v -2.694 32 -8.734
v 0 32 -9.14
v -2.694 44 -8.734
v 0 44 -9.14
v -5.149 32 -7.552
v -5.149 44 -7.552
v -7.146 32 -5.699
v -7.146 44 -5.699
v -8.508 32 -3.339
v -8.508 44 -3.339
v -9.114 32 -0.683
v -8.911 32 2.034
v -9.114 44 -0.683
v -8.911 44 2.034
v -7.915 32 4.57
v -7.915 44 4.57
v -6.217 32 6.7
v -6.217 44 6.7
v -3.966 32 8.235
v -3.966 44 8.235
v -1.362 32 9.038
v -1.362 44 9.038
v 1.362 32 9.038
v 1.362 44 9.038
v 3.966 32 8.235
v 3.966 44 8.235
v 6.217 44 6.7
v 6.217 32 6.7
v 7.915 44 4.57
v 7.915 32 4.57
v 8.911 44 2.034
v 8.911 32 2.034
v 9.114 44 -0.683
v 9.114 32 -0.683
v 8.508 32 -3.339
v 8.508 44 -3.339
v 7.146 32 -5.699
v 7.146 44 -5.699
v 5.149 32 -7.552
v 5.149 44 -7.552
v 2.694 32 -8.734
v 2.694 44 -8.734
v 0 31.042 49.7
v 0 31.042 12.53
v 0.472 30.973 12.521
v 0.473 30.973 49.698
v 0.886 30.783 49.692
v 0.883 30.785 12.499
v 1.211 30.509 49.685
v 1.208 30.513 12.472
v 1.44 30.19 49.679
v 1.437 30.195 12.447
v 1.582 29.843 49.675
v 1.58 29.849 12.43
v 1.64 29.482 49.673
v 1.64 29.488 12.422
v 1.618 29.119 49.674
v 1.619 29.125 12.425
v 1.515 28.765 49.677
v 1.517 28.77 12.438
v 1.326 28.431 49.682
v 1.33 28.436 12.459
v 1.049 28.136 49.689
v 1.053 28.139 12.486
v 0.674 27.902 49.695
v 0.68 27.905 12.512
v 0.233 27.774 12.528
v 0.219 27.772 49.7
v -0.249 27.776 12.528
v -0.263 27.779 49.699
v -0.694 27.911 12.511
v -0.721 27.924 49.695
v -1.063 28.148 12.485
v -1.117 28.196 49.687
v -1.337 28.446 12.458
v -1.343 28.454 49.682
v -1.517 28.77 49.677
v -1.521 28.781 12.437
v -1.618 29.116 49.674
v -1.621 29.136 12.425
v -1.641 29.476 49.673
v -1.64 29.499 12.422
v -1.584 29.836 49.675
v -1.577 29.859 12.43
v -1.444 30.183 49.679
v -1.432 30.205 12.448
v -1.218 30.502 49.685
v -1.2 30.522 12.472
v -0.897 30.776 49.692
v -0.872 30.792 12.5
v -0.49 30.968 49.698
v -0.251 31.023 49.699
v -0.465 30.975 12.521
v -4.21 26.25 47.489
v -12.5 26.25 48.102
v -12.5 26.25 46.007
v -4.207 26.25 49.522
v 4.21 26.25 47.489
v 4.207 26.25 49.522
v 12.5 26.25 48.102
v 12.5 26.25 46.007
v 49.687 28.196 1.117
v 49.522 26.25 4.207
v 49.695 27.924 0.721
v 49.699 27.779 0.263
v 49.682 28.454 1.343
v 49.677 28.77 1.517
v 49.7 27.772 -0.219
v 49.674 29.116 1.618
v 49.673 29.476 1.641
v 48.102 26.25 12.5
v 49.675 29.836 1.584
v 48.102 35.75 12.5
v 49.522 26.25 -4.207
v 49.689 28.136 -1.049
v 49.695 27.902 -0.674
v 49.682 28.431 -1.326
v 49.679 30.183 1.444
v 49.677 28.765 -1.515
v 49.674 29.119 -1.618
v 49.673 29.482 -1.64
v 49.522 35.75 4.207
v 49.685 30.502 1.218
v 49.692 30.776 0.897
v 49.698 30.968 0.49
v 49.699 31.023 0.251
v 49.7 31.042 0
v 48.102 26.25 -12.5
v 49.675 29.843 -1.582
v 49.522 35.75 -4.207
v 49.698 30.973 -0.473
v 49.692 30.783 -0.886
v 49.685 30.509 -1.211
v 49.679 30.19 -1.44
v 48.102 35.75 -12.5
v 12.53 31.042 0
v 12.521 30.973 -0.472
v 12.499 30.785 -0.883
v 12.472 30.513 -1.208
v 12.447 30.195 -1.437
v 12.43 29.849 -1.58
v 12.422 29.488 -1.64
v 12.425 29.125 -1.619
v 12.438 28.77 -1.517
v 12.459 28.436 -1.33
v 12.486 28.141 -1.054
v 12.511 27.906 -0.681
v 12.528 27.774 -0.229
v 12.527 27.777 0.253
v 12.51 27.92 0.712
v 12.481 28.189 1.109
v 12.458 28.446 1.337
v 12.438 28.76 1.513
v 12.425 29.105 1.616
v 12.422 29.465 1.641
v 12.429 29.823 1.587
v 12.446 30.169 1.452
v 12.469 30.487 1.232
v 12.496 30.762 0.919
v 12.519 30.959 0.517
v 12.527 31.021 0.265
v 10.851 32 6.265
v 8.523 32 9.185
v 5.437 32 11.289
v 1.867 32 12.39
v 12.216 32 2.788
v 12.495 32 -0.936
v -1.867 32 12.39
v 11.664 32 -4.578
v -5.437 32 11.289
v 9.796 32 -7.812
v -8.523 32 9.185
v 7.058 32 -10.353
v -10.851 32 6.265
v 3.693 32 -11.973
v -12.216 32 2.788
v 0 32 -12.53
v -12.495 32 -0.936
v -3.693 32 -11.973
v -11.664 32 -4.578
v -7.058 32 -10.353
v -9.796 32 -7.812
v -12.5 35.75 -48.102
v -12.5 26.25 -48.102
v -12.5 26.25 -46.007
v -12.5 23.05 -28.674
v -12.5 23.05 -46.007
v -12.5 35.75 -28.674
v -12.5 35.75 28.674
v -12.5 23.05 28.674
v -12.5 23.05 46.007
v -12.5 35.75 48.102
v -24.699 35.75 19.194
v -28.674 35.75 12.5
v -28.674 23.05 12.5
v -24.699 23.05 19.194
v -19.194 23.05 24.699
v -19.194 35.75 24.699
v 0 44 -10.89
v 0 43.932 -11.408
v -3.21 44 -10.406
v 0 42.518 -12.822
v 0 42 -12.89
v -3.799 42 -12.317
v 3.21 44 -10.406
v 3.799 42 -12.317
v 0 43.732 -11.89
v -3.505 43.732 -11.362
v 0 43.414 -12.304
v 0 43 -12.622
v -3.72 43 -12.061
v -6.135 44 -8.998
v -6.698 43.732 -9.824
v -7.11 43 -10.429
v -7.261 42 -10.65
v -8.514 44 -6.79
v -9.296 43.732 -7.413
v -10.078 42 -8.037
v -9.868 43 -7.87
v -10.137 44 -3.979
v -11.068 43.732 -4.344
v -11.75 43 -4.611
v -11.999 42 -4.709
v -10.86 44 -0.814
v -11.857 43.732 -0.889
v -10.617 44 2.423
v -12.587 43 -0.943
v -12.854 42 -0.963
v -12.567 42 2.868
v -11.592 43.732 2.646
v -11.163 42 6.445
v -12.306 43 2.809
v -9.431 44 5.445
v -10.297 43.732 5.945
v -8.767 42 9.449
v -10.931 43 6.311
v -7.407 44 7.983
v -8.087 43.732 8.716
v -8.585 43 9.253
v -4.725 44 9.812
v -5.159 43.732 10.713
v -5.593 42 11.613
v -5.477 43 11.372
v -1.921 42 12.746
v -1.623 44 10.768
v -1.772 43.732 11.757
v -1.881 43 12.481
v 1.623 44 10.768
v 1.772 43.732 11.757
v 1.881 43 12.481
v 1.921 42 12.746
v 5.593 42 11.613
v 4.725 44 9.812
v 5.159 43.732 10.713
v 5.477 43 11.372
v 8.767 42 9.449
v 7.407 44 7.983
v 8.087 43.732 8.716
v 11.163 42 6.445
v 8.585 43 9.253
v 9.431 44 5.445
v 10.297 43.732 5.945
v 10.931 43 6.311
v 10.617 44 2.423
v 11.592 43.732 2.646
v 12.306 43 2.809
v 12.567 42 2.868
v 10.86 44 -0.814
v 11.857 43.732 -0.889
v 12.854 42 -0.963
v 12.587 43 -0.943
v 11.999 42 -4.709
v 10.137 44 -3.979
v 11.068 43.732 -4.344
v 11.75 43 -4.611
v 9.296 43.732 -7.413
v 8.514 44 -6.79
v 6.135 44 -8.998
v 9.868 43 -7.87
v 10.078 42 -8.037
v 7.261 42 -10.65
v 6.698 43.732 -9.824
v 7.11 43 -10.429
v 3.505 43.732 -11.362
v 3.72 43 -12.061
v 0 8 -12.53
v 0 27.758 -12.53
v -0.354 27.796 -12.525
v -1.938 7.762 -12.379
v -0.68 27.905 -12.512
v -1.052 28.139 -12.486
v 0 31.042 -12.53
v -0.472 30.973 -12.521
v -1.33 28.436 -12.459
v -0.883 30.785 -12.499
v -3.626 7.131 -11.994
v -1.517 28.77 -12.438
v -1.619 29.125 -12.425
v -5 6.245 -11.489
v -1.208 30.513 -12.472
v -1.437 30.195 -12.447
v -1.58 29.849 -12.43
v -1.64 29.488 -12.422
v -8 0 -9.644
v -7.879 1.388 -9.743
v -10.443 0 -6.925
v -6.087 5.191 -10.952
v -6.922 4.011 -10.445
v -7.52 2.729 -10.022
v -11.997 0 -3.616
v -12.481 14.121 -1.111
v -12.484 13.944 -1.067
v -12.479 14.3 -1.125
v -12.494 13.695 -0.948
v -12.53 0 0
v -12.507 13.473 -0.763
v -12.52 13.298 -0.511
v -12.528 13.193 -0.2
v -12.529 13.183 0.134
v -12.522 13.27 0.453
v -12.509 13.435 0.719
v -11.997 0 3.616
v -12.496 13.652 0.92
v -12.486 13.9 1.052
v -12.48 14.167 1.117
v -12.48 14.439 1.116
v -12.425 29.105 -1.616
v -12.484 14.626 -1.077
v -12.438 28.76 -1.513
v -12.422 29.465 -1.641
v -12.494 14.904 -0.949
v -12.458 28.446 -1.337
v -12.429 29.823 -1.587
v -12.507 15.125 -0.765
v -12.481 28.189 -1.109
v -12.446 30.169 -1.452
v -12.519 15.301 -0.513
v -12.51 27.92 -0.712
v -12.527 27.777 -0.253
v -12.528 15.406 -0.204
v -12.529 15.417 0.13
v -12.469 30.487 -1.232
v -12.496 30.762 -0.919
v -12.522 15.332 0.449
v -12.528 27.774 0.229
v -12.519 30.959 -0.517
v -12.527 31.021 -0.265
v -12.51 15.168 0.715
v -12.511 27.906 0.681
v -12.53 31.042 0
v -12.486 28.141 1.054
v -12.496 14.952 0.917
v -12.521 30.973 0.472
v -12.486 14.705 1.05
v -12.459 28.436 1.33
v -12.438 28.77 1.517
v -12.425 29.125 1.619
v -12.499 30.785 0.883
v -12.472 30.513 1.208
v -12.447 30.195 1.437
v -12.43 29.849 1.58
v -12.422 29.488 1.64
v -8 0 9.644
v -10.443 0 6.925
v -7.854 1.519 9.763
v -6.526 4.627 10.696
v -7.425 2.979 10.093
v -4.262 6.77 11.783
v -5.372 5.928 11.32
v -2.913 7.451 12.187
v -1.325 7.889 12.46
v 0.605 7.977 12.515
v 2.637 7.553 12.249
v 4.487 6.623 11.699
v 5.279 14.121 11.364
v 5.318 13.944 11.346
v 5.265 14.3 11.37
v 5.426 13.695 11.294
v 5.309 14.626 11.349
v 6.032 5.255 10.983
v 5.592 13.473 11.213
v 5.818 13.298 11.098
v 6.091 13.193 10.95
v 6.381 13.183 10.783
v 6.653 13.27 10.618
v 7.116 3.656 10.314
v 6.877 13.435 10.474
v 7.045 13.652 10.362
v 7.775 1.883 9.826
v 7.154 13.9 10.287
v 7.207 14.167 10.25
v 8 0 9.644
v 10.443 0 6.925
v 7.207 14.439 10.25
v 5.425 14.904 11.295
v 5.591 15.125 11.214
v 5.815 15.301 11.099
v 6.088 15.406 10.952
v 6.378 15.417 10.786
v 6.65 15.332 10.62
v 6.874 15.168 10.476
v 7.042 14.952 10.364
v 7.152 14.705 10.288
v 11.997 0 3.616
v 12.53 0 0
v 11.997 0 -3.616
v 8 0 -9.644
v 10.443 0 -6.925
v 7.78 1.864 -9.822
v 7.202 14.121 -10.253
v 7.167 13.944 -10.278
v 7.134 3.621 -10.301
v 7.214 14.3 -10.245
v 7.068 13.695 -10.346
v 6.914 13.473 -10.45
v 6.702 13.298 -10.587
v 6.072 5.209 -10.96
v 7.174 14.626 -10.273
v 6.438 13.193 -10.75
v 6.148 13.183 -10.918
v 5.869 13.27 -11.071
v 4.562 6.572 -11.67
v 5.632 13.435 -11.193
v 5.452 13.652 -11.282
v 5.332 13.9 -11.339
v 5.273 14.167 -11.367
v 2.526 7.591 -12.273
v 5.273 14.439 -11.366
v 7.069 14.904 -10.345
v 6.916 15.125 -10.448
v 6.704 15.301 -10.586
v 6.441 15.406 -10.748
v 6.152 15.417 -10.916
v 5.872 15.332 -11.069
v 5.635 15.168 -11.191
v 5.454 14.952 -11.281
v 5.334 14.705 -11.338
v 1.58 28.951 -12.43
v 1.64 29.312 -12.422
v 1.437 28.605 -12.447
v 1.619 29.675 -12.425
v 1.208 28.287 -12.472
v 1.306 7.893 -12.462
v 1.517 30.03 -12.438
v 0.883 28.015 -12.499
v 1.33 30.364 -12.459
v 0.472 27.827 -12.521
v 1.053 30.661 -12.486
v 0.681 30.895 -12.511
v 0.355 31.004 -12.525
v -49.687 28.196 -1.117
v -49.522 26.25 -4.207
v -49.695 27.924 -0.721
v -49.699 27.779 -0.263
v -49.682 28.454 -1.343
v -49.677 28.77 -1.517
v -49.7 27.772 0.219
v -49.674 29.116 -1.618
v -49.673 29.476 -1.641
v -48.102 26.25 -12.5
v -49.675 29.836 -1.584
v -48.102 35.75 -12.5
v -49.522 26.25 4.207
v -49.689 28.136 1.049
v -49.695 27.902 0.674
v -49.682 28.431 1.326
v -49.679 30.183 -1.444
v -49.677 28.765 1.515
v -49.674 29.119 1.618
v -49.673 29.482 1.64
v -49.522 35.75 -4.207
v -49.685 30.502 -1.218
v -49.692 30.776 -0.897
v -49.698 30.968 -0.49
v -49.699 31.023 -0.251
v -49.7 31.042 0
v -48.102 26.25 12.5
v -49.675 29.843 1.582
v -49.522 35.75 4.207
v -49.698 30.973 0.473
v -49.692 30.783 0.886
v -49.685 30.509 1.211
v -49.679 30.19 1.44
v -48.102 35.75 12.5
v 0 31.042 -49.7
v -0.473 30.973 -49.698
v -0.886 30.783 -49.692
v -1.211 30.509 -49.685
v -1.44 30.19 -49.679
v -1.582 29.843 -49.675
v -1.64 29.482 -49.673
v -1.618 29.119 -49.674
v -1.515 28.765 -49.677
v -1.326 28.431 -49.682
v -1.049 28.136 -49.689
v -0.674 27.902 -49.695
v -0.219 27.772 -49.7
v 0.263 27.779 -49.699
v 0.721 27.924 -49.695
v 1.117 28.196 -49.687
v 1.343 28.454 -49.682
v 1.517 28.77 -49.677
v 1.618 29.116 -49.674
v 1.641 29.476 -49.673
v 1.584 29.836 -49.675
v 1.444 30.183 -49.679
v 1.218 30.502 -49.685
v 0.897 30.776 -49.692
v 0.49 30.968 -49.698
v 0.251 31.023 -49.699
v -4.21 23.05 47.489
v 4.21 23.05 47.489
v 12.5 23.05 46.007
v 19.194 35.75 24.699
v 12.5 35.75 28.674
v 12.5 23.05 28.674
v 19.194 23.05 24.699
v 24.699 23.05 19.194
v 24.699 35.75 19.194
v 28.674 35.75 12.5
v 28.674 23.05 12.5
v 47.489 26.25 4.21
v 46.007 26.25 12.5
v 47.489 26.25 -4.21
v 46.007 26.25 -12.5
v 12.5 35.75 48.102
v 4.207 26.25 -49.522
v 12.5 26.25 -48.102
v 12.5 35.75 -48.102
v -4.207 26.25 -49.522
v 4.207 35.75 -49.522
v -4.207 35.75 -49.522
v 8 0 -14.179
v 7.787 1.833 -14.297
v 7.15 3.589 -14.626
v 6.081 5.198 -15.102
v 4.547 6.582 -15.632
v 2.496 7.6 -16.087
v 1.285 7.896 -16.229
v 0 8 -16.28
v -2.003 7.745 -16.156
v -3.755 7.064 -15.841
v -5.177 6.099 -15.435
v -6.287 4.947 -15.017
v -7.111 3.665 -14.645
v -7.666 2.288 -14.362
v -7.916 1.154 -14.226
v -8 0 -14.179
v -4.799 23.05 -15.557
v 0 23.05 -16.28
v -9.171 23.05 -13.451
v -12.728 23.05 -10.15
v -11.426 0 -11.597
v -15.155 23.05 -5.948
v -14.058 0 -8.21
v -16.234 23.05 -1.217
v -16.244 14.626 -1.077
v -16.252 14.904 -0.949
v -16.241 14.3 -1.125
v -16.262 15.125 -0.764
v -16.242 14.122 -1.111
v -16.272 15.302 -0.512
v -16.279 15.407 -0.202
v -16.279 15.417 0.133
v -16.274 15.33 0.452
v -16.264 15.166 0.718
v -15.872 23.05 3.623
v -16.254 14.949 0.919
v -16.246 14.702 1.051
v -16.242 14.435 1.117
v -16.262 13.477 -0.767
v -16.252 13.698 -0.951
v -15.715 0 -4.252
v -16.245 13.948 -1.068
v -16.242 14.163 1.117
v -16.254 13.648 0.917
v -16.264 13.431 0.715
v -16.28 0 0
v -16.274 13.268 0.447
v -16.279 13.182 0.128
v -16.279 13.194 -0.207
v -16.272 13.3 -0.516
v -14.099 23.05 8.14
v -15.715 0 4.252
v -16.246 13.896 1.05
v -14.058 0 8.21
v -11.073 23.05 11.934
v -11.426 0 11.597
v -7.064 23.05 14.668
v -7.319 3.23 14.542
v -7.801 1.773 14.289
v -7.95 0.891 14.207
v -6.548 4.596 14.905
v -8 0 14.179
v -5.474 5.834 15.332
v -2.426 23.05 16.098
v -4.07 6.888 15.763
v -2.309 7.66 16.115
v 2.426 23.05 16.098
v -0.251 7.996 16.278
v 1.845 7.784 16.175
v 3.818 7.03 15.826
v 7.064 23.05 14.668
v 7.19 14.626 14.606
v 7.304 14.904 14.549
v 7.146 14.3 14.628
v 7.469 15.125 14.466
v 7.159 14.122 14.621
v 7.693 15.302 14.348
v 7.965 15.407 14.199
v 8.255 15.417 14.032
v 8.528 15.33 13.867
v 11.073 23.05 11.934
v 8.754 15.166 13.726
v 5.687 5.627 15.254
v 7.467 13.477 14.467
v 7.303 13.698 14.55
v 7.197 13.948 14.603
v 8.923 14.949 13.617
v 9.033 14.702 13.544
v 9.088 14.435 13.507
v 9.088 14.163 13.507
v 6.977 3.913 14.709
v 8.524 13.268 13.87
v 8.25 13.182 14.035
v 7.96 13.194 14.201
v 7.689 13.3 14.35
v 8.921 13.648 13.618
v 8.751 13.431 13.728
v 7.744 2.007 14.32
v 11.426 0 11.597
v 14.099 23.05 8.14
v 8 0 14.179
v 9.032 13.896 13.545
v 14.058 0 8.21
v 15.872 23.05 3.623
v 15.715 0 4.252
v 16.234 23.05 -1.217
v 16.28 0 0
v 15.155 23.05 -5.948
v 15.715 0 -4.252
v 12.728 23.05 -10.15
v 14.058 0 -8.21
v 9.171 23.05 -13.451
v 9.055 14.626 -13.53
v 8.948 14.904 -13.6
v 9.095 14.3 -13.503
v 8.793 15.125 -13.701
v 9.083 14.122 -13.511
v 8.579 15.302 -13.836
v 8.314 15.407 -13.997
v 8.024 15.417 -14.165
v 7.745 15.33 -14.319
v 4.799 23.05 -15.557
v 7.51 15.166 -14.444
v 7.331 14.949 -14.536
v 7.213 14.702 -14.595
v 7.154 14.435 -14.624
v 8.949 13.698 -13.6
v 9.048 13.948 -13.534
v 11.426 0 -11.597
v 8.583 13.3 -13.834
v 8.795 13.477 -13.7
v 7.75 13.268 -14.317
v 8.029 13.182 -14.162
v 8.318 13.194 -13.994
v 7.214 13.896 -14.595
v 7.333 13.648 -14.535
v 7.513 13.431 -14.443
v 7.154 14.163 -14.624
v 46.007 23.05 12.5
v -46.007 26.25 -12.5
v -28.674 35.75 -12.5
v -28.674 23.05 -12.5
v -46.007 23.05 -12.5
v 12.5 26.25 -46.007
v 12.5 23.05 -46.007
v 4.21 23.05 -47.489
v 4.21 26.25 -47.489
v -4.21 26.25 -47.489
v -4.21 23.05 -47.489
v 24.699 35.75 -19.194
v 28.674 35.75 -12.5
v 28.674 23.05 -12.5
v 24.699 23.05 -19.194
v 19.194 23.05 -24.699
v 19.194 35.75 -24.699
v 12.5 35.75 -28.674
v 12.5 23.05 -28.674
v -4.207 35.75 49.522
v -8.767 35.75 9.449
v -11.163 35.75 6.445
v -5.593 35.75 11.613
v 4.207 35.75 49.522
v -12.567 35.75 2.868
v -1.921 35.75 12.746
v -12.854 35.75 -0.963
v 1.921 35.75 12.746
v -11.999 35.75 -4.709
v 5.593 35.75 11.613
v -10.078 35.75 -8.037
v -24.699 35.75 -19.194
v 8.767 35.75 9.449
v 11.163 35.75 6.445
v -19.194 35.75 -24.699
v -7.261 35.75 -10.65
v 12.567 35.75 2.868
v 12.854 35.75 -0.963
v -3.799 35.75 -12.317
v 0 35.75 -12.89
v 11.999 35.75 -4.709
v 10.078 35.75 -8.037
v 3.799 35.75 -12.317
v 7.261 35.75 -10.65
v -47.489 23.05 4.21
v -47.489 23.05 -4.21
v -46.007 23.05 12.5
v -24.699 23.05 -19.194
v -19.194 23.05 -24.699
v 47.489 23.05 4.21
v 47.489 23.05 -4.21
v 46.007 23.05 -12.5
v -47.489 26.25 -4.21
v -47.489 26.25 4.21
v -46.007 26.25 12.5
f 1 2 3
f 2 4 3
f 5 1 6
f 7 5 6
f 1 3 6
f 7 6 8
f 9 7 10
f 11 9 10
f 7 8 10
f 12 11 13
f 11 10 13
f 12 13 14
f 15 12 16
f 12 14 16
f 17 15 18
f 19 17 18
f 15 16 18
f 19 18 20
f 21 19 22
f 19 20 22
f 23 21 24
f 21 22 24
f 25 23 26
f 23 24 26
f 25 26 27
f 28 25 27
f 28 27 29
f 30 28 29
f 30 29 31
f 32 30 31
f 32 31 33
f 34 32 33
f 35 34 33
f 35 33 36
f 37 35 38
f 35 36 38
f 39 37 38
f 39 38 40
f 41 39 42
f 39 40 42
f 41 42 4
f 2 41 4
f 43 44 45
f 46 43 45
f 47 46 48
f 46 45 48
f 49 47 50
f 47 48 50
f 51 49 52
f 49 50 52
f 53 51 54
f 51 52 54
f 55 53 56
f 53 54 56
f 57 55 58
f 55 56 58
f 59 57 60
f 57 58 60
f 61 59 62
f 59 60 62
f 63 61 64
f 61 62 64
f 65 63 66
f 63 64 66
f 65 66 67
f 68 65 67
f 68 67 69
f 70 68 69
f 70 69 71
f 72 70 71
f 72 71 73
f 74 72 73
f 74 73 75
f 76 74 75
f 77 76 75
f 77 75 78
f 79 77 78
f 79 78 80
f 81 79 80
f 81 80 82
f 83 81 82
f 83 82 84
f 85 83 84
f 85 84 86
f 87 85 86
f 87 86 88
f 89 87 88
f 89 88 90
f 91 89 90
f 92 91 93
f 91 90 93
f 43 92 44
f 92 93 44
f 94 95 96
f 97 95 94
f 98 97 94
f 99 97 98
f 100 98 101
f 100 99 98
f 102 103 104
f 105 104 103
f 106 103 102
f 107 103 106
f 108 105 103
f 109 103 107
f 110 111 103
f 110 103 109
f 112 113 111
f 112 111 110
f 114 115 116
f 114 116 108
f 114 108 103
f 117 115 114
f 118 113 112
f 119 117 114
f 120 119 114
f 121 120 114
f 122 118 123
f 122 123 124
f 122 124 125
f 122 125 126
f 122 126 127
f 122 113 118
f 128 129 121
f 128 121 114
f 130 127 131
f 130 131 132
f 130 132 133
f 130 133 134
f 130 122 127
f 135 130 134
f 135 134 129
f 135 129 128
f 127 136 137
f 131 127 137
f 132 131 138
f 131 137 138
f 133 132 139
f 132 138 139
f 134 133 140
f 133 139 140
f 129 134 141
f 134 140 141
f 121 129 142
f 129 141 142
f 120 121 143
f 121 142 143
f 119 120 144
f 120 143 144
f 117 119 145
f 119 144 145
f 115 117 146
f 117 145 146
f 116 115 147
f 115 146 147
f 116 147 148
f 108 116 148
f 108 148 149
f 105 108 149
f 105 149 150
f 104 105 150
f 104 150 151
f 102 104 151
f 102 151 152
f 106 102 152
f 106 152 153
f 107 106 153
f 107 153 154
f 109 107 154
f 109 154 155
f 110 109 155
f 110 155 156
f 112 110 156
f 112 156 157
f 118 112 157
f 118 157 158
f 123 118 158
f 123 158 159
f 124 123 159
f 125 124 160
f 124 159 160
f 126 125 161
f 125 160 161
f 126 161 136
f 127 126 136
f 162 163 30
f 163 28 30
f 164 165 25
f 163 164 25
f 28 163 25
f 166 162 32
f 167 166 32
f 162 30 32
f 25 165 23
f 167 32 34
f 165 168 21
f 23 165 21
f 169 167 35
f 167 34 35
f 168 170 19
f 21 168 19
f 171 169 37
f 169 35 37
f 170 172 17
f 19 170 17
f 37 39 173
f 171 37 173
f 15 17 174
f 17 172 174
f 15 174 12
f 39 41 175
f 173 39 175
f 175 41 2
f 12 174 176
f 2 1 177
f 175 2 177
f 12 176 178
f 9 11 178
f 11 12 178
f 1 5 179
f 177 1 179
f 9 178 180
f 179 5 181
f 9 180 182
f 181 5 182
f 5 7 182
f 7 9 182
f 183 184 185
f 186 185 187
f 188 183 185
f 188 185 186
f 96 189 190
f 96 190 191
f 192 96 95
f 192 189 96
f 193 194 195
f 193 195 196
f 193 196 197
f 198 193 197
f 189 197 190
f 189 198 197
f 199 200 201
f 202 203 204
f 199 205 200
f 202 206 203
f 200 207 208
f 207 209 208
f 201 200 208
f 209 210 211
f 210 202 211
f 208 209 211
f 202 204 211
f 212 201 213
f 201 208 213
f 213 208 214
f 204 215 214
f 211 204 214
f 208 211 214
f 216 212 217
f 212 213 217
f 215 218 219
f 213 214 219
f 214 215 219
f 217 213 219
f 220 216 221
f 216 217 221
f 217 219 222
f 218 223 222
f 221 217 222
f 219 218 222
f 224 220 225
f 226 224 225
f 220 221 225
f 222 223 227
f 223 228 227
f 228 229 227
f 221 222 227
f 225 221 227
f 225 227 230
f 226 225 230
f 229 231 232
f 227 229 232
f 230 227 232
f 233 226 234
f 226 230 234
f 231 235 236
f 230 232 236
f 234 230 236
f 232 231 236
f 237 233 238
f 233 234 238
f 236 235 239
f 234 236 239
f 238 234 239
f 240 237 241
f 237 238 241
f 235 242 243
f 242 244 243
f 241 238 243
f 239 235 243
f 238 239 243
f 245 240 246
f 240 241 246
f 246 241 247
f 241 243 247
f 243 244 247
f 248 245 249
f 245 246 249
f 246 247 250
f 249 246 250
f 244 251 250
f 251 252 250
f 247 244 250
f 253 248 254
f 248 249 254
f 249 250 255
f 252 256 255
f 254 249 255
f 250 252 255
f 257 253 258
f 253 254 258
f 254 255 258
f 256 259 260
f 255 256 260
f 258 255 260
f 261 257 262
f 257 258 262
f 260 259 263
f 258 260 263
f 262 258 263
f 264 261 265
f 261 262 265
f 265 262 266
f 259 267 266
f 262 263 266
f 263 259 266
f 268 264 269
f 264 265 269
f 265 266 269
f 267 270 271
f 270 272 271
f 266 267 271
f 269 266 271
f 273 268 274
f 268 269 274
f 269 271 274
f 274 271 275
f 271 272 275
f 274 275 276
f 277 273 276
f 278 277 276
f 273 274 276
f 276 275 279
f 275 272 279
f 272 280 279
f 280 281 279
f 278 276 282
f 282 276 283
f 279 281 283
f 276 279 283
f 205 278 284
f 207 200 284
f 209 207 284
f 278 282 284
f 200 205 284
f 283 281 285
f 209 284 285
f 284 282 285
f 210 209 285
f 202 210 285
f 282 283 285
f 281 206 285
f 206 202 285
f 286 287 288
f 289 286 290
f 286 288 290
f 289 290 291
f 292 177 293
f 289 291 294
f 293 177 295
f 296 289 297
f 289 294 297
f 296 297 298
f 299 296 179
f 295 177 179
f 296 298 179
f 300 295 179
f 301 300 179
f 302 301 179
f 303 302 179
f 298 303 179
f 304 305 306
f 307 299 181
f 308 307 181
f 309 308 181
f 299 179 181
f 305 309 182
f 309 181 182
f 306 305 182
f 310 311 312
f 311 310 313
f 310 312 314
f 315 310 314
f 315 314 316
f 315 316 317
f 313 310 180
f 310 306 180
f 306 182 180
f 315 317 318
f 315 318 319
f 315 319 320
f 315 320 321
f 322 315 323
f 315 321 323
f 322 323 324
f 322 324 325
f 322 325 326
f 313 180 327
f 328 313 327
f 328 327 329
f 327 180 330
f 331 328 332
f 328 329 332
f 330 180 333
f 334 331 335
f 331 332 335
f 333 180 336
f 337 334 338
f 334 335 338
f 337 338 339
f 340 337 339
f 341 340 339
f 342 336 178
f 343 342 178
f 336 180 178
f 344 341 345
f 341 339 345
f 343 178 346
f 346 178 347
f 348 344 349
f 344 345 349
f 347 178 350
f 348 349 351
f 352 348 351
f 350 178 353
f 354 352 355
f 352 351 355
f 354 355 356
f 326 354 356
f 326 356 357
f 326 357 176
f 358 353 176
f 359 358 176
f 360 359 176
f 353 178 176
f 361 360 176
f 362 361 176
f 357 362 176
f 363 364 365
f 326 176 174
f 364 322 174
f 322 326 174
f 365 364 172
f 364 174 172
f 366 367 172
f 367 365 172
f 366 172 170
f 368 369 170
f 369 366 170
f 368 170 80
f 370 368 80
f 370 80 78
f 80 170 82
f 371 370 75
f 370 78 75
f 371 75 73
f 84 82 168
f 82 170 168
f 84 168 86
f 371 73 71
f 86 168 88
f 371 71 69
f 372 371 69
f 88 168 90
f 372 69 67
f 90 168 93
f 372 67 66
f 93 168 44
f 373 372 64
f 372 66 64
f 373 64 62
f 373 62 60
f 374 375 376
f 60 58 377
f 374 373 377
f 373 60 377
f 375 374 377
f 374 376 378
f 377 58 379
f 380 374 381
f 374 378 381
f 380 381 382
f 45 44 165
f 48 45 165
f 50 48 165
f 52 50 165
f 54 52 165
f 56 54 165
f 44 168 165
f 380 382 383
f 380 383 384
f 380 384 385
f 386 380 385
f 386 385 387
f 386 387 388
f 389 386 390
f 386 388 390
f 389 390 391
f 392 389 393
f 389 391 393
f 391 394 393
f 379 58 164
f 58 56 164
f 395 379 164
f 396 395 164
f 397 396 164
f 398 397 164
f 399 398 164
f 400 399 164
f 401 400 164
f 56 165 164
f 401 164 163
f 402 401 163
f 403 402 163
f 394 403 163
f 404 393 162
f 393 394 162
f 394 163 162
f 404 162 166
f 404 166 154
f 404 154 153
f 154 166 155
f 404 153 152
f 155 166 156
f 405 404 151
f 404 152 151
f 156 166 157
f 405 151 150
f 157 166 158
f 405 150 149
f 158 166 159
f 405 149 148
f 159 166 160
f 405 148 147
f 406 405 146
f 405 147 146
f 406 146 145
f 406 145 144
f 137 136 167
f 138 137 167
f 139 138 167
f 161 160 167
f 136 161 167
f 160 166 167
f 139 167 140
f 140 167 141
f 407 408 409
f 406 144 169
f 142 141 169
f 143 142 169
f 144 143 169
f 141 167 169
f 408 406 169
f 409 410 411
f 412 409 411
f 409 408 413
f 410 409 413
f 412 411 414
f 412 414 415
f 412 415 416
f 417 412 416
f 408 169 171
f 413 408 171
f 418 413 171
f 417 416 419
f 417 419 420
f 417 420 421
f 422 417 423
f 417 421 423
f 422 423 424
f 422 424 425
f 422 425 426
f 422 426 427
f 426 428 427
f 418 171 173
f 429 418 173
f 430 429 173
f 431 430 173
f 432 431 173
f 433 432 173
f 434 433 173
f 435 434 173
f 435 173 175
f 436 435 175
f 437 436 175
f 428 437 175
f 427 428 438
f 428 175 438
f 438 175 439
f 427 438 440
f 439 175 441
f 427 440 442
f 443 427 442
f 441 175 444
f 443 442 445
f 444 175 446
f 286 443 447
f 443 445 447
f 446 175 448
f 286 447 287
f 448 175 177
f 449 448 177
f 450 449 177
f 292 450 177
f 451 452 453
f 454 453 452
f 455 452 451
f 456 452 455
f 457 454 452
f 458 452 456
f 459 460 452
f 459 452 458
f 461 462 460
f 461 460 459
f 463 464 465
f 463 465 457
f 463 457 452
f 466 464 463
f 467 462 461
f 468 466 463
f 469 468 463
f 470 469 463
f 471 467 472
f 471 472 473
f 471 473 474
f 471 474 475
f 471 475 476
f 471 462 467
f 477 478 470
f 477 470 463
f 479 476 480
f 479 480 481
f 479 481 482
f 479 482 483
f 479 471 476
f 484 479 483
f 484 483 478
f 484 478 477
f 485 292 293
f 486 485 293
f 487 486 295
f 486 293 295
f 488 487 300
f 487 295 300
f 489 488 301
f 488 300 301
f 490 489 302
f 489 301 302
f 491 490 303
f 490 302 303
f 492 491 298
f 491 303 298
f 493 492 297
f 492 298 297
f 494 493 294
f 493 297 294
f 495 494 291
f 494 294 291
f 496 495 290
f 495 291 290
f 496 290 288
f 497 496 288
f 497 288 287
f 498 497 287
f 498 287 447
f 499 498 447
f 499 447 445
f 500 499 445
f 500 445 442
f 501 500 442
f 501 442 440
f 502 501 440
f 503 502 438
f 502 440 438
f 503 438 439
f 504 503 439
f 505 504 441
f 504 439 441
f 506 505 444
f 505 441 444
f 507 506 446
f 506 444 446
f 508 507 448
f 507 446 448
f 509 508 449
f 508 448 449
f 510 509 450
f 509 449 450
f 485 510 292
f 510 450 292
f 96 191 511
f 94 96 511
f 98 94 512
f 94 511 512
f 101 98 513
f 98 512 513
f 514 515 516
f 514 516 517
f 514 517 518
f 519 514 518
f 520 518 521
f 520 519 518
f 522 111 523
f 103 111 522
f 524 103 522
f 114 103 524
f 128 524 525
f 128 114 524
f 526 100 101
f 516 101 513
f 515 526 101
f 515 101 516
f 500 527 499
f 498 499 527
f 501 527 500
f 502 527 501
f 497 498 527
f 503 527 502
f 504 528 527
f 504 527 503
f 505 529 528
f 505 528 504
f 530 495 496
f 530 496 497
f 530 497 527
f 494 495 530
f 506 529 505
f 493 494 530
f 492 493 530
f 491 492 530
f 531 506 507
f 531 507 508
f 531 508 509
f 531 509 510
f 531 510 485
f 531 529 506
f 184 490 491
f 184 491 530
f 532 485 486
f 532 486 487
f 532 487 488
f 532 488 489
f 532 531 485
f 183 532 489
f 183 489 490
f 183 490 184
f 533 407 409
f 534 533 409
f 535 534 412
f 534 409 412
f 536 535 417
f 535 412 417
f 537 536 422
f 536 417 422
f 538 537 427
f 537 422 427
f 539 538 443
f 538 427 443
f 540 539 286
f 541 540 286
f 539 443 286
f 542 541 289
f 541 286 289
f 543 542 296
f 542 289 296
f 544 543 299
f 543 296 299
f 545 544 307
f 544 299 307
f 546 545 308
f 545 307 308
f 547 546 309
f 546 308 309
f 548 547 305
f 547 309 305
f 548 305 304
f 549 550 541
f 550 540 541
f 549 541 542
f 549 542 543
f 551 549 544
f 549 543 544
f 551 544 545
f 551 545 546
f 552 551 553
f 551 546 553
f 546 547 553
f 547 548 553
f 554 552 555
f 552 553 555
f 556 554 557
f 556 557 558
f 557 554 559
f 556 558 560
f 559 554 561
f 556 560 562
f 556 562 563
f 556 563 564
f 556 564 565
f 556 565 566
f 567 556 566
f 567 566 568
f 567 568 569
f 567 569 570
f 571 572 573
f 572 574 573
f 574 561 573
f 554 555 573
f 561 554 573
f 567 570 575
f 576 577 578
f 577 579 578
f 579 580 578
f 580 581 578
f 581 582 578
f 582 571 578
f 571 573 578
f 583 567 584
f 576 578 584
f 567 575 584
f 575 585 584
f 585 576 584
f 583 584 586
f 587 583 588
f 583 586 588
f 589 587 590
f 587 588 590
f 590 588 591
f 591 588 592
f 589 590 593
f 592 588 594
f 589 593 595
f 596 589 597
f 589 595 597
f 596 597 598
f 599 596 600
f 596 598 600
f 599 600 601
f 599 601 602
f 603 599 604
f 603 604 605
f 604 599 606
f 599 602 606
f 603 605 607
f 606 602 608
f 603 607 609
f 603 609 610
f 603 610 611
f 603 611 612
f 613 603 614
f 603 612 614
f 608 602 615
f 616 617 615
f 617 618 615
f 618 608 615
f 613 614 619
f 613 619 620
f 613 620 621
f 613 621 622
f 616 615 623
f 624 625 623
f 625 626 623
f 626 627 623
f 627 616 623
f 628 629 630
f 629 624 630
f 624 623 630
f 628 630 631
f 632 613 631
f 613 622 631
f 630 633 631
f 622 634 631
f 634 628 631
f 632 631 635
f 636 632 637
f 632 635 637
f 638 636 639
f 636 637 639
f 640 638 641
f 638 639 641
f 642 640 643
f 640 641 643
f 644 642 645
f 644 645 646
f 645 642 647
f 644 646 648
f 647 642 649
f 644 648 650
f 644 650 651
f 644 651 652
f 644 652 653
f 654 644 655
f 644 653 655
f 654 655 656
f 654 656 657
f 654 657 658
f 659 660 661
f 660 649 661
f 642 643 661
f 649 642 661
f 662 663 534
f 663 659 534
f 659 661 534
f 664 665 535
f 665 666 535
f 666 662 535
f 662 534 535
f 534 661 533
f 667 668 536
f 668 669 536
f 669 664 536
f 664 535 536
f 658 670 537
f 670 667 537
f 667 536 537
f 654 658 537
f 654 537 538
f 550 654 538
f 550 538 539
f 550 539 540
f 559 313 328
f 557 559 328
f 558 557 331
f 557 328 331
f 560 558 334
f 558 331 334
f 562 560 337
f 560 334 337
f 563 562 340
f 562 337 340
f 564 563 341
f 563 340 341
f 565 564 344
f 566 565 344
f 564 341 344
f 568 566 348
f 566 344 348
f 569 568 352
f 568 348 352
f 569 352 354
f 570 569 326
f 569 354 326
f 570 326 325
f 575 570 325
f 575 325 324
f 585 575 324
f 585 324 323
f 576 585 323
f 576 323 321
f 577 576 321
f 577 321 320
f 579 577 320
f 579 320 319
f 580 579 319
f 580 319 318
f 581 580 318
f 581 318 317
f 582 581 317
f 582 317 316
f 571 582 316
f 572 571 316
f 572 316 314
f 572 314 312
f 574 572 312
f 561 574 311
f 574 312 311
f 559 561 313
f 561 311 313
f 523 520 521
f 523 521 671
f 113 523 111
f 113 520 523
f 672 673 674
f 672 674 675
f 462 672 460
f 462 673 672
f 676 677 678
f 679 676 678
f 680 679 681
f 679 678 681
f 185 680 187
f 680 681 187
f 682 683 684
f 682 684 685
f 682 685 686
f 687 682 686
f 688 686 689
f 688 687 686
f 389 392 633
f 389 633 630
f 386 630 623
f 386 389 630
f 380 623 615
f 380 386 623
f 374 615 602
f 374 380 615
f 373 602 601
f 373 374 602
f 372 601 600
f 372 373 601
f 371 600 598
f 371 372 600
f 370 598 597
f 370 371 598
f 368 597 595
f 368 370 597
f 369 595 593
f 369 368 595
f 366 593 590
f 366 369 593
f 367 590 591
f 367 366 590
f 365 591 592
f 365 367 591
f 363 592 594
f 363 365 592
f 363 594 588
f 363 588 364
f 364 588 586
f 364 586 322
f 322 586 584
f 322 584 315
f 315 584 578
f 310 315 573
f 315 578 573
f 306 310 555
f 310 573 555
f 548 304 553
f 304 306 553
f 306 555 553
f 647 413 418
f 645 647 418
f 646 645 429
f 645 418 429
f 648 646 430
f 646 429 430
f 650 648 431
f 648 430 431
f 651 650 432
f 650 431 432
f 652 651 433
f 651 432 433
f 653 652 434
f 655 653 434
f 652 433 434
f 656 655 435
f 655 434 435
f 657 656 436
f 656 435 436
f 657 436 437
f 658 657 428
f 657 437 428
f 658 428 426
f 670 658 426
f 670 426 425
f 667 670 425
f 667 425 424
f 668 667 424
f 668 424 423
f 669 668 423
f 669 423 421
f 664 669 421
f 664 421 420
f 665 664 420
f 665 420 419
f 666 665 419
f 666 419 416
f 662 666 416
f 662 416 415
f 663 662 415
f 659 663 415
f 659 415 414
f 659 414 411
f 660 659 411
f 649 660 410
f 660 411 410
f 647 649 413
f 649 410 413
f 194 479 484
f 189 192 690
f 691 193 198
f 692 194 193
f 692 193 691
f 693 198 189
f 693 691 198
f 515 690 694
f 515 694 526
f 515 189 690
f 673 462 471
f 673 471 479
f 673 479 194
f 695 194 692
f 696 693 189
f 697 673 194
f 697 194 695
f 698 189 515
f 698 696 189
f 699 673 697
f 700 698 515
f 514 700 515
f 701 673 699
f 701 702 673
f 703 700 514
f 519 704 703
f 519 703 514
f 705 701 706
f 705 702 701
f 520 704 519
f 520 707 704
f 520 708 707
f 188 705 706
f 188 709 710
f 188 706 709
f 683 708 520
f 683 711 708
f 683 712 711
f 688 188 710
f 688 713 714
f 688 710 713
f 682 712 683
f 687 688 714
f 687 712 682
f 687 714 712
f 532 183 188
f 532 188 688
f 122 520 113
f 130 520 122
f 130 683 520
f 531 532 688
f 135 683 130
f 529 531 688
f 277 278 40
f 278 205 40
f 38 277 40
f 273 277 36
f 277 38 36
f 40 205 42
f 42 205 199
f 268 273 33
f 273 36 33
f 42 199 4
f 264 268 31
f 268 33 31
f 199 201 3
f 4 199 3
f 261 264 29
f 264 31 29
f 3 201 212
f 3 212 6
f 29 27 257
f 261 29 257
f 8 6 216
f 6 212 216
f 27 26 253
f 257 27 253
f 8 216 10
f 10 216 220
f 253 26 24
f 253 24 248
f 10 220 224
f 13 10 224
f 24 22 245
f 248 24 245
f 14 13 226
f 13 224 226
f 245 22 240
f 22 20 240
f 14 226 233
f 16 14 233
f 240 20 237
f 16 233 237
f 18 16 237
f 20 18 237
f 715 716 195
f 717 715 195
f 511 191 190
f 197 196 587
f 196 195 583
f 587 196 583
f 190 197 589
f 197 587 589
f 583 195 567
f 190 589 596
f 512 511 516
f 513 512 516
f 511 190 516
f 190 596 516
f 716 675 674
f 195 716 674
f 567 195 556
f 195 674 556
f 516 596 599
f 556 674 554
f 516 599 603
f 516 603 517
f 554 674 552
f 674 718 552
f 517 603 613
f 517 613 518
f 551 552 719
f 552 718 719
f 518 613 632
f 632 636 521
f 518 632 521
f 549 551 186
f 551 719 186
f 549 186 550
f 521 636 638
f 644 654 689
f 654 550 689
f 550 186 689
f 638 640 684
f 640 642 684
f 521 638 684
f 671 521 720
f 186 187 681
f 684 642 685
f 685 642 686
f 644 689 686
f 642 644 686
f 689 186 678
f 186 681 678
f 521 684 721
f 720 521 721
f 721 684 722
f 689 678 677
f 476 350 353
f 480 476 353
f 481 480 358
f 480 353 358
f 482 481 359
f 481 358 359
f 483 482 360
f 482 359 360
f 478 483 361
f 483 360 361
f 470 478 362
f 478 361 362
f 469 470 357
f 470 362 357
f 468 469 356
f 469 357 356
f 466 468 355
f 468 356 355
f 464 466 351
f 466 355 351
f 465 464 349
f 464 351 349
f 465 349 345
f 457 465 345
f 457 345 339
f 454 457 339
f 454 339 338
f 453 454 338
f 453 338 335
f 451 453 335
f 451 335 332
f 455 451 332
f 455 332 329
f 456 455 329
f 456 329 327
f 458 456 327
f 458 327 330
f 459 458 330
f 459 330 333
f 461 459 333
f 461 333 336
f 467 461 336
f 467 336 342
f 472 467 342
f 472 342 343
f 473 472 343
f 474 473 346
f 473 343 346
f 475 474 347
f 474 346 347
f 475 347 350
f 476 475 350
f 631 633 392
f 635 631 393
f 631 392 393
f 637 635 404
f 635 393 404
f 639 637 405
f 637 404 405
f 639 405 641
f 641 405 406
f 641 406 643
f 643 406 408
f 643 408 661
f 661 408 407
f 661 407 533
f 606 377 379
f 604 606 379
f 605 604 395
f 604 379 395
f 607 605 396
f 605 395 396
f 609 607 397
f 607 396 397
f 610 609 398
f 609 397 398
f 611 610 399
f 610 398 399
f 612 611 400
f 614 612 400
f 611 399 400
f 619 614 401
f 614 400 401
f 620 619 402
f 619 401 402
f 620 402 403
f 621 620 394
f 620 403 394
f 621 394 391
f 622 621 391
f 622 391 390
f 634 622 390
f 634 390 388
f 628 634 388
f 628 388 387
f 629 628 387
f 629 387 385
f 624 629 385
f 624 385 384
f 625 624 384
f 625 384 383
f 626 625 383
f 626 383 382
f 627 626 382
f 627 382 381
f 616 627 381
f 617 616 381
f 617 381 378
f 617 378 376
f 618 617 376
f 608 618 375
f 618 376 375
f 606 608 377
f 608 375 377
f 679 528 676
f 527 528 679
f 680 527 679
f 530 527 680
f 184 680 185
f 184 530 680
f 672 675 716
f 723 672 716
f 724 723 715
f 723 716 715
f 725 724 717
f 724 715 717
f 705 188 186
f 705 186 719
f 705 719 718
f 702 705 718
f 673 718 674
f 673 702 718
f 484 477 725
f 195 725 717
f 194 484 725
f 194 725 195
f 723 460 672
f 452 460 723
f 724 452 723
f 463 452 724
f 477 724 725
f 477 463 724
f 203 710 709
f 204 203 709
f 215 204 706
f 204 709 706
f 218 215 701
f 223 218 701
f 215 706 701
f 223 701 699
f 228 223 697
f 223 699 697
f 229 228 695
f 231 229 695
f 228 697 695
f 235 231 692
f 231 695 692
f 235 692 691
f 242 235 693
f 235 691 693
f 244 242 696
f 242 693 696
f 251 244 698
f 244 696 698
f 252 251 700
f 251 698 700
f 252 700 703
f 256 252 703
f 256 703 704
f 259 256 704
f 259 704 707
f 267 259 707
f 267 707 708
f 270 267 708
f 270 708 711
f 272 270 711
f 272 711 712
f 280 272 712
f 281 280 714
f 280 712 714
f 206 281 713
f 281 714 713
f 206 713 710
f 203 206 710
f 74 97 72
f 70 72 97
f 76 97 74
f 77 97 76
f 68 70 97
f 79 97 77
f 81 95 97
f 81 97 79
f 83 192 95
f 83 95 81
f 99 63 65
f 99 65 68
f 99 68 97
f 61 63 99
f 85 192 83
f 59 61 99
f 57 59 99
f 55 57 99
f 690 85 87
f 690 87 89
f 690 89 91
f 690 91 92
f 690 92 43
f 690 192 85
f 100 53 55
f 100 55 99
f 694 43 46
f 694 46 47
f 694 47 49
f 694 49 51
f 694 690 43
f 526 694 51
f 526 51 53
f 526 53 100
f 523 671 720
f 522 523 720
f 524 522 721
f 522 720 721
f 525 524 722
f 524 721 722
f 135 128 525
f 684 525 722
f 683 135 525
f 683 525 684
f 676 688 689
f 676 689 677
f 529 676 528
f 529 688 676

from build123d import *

# Parameters (mm, degrees)
CUT_EXTRUDE3_DEPTH      = 17.28
CUT_EXTRUDE3_DEPTH_BACK = 17.28
SKETCH3_R               = 1.125
CUT_EXTRUDE4_DEPTH      = 17.2800001
CIRPATTERN1_COUNT       = 3
FILLET4_R               = 2
SKETCH4_R               = 16.28
BOSS_EXTRUDE1_DEPTH     = 12.7
SKETCH5_R               = 1.6425
CUT_EXTRUDE5_DEPTH      = 50.7
CUT_EXTRUDE6_DEPTH      = 3.2004
CIRPATTERN2_COUNT       = 4
CIRPATTERN3_COUNT       = 4


with BuildPart() as part:
    # Sketch1 → Revolve1 (revolve)
    with BuildSketch(Plane.XY, mode=Mode.PRIVATE) as revolve1_sk:
        Polygon((9.14, 44), (12.89, 44), (12.89, 35.75), (16.28, 35.75), (16.28, 0), (12.53, 0), (12.53, 32), (9.14, 32), align=None)
    revolve(revolve1_sk.sketch.rotate(Axis((0, 0, 0), (0, 1, 0)), 90), axis=Axis((0, 0, 0), (0, 1, 0)))  # turned: the seam where the file's is

    # Sketch2 → Cut-Extrude3 (cut, two sides)
    with BuildSketch(Plane.XY) as cut_extrude3_sk:
        with BuildLine():
            Line((-8, 0), (8, 0))
            ThreePointArc((8, 0), (0, 8), (-8, 0))
        make_face()
    extrude(amount=CUT_EXTRUDE3_DEPTH, mode=Mode.SUBTRACT)
    extrude(cut_extrude3_sk.sketch, amount=-CUT_EXTRUDE3_DEPTH_BACK, mode=Mode.SUBTRACT)

    # Sketch3 → Cut-Extrude4 (cut, through all)
    with BuildSketch(Plane(origin=(0, 0, 0), x_dir=(0, 0, -1), z_dir=(1, 0, 0))):
        with Locations((0, 14.3)):
            Circle(SKETCH3_R)
    cut_extrude4 = extrude(amount=-CUT_EXTRUDE4_DEPTH, mode=Mode.SUBTRACT)

    # CirPattern1: Cut-Extrude4 ×3 about axis
    cirpattern1_axis = Axis((0, 46.725, 0), (0, -1, 0))
    for i in range(1, CIRPATTERN1_COUNT):
        add(cut_extrude4.rotate(cirpattern1_axis, i * 360 / CIRPATTERN1_COUNT), mode=Mode.SUBTRACT)

    # Fillet4
    fillet4_edges = [part.edges().sort_by_distance(p)[0] for p in [
        (0, 44, 12.89),
    ]]
    fillet(fillet4_edges, radius=FILLET4_R)

    # Sketch4 → Boss-Extrude1 (add)
    with BuildSketch(Plane(origin=(0, 35.75, 0), x_dir=(1, 0, 0), z_dir=(0, 1, 0))):
        with BuildLine():
            Line((-12.5, 48.102390793), (-12.5, 28.673827788))
            ThreePointArc((-12.5, 28.673827788), (-22.118300116, 22.118300116), (-28.673827788, 12.5))
            Line((-28.673827788, 12.5), (-48.102390793, 12.5))
            ThreePointArc((-48.102390793, 12.5), (-49.7, 0), (-48.102390793, -12.5))
            Line((-48.102390793, -12.5), (-28.673827788, -12.5))
            ThreePointArc((-28.673827788, -12.5), (-22.118300116, -22.118300116), (-12.5, -28.673827788))
            Line((-12.5, -28.673827788), (-12.5, -48.102390793))
            ThreePointArc((-12.5, -48.102390793), (0, -49.7), (12.5, -48.102390793))
            Line((12.5, -48.102390793), (12.5, -28.673827788))
            ThreePointArc((12.5, -28.673827788), (22.118300116, -22.118300116), (28.673827788, -12.5))
            Line((28.673827788, -12.5), (48.102390793, -12.5))
            ThreePointArc((48.102390793, -12.5), (49.7, 0), (48.102390793, 12.5))
            Line((48.102390793, 12.5), (28.673827788, 12.5))
            ThreePointArc((28.673827788, 12.5), (22.118300116, 22.118300116), (12.5, 28.673827788))
            Line((12.5, 28.673827788), (12.5, 48.102390793))
            ThreePointArc((12.5, 48.102390793), (0, 49.7), (-12.5, 48.102390793))
        make_face()
        with Locations(Location((0, 0, 0), (0, 0, 119.432673442))):  # turned: the seam where the file's is
            Circle(SKETCH4_R, mode=Mode.SUBTRACT)
    extrude(amount=-BOSS_EXTRUDE1_DEPTH)

    # Sketch5 → Cut-Extrude5 (cut, through all)
    with BuildSketch(Plane.XY):
        with Locations(Location((0, 29.4, 0), (0, 0, 90))):  # turned: the seam where the file's is
            Circle(SKETCH5_R)
    cut_extrude5 = extrude(amount=-CUT_EXTRUDE5_DEPTH, mode=Mode.SUBTRACT)

    # Sketch6 → Cut-Extrude6 (cut)
    with BuildSketch(Plane.XZ.offset(-23.05)):
        with BuildLine():
            Line((-12.5, 48.102390793), (-12.5, 46.007125807))
            ThreePointArc((-12.5, 46.007125807), (0, 47.675), (12.5, 46.007125807))
            Line((12.5, 46.007125807), (12.5, 48.102390793))
            ThreePointArc((12.5, 48.102390793), (0, 49.7), (-12.5, 48.102390793))
        make_face()
    cut_extrude6 = extrude(amount=-CUT_EXTRUDE6_DEPTH, mode=Mode.SUBTRACT)

    # CirPattern2: Cut-Extrude5 ×4 about axis
    cirpattern2_axis = Axis((0, 46.725, 0), (0, -1, 0))
    for i in range(1, CIRPATTERN2_COUNT):
        add(cut_extrude5.rotate(cirpattern2_axis, i * 360 / CIRPATTERN2_COUNT), mode=Mode.SUBTRACT)

    # CirPattern3: Cut-Extrude6 ×4 about axis
    cirpattern3_axis = Axis((0, 46.725, 0), (0, -1, 0))
    for i in range(1, CIRPATTERN3_COUNT):
        add(cut_extrude6.rotate(cirpattern3_axis, i * 360 / CIRPATTERN3_COUNT), mode=Mode.SUBTRACT)


solid = part.part
